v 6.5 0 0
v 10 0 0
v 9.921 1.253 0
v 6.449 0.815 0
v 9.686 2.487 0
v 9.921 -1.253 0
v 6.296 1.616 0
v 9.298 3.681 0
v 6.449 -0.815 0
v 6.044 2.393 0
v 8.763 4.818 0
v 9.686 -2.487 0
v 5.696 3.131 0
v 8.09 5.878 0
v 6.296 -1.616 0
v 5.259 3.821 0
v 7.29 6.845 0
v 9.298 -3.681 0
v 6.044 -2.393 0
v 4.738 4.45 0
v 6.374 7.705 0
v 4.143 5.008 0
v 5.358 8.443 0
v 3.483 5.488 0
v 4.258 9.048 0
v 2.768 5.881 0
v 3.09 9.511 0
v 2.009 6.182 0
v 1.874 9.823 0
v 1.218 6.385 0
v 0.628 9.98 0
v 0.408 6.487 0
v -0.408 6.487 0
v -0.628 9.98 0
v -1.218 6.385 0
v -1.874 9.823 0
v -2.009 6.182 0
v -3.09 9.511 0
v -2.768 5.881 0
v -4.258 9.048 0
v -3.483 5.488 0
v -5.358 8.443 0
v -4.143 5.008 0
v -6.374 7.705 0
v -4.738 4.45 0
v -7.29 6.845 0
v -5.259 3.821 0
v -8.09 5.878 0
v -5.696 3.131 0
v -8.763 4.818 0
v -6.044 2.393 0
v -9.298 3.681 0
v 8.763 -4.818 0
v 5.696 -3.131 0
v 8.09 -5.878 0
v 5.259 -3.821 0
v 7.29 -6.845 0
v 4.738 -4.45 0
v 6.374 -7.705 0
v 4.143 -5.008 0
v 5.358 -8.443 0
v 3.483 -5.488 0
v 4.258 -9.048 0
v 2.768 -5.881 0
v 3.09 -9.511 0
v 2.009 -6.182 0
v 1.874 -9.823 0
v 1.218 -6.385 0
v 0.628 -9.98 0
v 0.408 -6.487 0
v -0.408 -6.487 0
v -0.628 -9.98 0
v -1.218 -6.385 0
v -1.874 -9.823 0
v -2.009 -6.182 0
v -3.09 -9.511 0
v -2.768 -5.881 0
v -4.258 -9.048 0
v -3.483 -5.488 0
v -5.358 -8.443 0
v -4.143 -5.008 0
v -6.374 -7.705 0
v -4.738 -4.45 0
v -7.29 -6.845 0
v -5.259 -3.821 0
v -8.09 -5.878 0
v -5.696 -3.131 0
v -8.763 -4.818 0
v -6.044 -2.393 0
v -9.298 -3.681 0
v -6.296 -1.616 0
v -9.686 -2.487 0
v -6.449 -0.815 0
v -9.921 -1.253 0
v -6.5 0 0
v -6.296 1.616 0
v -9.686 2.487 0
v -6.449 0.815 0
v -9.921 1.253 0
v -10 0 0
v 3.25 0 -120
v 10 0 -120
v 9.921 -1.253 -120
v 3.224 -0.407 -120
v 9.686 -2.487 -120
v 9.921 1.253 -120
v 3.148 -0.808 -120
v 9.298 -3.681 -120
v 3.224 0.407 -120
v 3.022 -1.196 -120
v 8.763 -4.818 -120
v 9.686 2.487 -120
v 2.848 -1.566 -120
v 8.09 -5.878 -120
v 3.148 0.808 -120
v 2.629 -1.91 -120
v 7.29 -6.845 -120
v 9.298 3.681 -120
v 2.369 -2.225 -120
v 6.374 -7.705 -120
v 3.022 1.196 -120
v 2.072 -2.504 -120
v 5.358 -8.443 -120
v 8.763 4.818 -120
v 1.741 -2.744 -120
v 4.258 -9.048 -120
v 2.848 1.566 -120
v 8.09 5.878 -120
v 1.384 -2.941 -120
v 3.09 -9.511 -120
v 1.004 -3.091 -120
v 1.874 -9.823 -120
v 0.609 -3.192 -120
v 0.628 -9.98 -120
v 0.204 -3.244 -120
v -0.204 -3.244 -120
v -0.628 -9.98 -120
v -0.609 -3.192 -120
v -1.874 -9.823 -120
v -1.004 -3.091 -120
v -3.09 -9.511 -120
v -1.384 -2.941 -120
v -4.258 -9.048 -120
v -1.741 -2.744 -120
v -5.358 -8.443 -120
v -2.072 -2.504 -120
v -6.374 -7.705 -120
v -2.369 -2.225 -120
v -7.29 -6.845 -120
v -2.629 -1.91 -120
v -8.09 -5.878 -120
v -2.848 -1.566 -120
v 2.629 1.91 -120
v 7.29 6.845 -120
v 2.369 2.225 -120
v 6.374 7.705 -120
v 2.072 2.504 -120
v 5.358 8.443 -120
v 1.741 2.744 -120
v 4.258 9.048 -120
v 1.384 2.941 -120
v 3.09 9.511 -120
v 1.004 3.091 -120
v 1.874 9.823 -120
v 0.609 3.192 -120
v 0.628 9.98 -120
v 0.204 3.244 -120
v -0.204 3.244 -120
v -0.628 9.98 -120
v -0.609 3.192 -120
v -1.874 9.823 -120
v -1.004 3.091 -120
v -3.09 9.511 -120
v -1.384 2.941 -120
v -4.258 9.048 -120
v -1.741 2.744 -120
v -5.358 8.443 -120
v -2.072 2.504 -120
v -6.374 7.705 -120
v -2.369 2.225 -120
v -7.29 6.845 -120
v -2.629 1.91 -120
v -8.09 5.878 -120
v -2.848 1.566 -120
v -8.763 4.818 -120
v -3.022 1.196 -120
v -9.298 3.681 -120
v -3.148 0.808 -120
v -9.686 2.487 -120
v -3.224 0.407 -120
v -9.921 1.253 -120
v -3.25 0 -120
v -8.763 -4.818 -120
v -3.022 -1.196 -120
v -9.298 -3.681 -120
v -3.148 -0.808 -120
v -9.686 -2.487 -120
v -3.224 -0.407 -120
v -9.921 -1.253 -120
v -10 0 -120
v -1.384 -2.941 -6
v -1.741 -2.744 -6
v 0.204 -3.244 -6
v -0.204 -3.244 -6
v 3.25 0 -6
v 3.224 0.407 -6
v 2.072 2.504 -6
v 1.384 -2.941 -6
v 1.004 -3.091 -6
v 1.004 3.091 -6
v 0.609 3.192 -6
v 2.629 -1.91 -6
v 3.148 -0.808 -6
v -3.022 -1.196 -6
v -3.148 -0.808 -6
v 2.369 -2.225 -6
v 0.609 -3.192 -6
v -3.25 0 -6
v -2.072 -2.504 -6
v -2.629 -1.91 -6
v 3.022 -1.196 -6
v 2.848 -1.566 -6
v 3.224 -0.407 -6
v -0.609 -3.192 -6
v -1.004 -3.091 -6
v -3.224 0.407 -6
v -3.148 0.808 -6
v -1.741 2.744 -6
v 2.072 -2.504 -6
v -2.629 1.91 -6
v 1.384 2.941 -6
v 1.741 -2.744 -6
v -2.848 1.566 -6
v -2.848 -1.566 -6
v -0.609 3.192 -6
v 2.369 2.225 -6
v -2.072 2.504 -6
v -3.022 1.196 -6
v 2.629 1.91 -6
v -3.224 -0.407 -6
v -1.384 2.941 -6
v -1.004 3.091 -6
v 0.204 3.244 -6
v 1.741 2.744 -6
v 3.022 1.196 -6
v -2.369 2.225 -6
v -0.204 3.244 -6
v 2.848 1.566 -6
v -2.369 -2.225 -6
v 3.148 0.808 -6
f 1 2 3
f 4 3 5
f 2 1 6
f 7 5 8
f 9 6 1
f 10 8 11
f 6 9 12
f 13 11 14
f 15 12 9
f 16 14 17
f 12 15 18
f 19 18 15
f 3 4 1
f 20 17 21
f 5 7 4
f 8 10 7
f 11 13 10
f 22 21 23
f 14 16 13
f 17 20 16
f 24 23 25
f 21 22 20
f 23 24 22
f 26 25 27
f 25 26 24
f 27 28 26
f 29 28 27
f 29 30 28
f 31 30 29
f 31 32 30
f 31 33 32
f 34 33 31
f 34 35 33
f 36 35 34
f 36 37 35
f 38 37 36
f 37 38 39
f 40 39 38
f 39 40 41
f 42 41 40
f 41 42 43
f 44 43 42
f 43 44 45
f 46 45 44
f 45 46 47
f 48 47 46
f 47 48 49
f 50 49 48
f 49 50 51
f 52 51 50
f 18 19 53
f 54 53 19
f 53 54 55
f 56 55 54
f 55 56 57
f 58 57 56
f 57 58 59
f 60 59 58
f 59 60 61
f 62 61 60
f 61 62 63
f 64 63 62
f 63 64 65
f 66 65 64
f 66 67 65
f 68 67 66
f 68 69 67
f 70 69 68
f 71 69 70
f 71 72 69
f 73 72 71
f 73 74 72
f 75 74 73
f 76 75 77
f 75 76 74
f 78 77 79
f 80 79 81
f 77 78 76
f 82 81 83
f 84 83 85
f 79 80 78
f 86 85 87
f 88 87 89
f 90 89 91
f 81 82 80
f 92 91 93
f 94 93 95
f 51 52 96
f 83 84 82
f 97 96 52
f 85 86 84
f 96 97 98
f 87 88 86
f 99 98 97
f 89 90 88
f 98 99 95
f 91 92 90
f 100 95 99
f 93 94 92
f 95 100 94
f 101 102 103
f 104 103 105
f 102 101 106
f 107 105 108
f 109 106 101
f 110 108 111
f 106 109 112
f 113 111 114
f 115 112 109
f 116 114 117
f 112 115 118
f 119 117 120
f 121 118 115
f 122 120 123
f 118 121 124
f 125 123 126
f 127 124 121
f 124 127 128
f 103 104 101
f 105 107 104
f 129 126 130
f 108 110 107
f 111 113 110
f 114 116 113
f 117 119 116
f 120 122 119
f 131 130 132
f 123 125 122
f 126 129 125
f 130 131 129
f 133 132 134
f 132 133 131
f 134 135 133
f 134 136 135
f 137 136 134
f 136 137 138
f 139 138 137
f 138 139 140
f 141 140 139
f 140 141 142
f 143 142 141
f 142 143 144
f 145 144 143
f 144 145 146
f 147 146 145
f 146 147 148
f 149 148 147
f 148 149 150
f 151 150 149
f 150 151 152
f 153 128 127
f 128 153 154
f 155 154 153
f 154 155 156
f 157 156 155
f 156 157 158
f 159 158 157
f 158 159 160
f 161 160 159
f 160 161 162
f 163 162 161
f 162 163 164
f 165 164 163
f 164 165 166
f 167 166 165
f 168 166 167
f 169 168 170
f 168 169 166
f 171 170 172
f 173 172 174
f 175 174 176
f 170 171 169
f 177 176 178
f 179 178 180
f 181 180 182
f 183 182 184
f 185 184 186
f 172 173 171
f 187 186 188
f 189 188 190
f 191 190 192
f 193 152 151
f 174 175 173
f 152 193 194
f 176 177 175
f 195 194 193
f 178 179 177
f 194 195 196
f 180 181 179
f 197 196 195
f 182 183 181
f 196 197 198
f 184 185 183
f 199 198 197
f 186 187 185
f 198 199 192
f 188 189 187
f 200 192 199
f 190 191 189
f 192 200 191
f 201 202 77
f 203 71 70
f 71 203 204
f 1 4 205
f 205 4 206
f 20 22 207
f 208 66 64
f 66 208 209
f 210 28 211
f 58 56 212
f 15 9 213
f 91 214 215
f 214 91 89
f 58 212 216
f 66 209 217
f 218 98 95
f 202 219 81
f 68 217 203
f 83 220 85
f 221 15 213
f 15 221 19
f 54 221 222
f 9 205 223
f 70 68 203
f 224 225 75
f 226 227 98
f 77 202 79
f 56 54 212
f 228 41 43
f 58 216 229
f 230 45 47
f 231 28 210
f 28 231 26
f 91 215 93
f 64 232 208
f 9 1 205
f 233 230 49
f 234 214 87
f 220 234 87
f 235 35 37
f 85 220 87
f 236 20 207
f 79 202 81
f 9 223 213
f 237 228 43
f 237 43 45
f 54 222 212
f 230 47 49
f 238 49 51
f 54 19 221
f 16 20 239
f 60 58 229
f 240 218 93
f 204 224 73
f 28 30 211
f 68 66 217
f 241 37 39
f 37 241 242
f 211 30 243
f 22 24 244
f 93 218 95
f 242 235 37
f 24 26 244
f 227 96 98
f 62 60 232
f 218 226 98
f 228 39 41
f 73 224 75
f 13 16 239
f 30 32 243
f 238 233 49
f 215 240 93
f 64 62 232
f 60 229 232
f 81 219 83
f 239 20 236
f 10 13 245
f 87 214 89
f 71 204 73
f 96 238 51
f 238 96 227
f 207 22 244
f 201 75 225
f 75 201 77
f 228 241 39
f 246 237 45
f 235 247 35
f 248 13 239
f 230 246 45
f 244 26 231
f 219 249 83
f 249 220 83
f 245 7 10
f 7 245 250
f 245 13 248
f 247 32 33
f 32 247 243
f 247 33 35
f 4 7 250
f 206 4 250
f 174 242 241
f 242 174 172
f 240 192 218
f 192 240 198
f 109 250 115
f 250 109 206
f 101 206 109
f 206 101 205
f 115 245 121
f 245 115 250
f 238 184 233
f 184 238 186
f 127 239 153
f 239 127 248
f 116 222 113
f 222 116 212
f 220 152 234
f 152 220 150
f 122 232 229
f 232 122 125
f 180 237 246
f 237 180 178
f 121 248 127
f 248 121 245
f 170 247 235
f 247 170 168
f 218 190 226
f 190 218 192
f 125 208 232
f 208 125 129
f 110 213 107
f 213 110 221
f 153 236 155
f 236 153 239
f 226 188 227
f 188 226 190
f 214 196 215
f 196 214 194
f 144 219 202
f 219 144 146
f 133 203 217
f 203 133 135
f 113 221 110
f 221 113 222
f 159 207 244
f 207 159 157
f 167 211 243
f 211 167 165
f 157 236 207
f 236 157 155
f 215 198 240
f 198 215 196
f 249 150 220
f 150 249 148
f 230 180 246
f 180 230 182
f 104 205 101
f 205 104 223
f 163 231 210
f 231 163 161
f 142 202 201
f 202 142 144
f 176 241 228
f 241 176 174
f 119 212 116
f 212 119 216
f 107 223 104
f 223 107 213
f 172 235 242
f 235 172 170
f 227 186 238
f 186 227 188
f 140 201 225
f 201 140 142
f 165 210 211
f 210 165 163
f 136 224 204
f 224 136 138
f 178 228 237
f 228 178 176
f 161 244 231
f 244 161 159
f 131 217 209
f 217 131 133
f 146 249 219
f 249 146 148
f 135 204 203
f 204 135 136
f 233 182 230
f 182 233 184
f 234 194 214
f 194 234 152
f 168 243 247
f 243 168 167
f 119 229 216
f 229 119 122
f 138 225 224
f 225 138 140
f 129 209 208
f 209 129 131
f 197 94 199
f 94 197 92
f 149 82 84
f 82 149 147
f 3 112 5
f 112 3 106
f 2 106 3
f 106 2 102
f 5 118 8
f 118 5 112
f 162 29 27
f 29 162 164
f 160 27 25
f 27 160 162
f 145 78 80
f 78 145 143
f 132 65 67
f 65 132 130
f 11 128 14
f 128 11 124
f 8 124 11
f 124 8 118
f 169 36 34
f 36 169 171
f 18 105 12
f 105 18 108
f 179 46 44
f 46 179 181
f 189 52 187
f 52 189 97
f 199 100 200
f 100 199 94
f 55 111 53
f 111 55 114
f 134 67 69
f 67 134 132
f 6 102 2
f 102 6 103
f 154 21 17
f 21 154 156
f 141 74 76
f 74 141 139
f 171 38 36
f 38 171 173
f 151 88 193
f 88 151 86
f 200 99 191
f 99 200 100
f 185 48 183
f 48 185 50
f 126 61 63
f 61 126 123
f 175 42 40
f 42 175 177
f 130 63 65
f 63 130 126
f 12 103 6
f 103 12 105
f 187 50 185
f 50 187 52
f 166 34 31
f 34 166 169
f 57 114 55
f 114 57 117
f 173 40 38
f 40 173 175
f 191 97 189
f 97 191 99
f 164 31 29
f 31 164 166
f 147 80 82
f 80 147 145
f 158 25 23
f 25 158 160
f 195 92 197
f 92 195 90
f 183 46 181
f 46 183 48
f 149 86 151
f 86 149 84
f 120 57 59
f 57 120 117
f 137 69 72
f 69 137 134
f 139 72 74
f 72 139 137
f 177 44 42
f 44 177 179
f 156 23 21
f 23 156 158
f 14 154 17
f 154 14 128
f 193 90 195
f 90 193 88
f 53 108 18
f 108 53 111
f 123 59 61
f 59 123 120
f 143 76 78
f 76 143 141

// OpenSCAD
$fn = 50;


difference() {
	union() {
		translate(v = [0, 0, -120.0000000000]) {
			cylinder(h = 120, r = 10.0000000000);
		}
		cylinder(h = 0, r = 16.0000000000);
	}
	union() {
		translate(v = [0, 0, 0]) {
			rotate(a = [0, 0, 0]) {
				difference() {
					union() {
						#translate(v = [0, 0, -120.0000000000]) {
							cylinder(h = 120, r = 2.2500000000);
						}
						#translate(v = [0, 0, -6]) {
							cylinder(h = 6, r1 = 3.2500000000, r2 = 6.5000000000);
						}
						#translate(v = [0, 0, -120.0000000000]) {
							cylinder(h = 120, r = 3.2500000000);
						}
						#translate(v = [0, 0, -120.0000000000]) {
							cylinder(h = 120, r = 2.2500000000);
						}
					}
					union();
				}
			}
		}
	}
}
